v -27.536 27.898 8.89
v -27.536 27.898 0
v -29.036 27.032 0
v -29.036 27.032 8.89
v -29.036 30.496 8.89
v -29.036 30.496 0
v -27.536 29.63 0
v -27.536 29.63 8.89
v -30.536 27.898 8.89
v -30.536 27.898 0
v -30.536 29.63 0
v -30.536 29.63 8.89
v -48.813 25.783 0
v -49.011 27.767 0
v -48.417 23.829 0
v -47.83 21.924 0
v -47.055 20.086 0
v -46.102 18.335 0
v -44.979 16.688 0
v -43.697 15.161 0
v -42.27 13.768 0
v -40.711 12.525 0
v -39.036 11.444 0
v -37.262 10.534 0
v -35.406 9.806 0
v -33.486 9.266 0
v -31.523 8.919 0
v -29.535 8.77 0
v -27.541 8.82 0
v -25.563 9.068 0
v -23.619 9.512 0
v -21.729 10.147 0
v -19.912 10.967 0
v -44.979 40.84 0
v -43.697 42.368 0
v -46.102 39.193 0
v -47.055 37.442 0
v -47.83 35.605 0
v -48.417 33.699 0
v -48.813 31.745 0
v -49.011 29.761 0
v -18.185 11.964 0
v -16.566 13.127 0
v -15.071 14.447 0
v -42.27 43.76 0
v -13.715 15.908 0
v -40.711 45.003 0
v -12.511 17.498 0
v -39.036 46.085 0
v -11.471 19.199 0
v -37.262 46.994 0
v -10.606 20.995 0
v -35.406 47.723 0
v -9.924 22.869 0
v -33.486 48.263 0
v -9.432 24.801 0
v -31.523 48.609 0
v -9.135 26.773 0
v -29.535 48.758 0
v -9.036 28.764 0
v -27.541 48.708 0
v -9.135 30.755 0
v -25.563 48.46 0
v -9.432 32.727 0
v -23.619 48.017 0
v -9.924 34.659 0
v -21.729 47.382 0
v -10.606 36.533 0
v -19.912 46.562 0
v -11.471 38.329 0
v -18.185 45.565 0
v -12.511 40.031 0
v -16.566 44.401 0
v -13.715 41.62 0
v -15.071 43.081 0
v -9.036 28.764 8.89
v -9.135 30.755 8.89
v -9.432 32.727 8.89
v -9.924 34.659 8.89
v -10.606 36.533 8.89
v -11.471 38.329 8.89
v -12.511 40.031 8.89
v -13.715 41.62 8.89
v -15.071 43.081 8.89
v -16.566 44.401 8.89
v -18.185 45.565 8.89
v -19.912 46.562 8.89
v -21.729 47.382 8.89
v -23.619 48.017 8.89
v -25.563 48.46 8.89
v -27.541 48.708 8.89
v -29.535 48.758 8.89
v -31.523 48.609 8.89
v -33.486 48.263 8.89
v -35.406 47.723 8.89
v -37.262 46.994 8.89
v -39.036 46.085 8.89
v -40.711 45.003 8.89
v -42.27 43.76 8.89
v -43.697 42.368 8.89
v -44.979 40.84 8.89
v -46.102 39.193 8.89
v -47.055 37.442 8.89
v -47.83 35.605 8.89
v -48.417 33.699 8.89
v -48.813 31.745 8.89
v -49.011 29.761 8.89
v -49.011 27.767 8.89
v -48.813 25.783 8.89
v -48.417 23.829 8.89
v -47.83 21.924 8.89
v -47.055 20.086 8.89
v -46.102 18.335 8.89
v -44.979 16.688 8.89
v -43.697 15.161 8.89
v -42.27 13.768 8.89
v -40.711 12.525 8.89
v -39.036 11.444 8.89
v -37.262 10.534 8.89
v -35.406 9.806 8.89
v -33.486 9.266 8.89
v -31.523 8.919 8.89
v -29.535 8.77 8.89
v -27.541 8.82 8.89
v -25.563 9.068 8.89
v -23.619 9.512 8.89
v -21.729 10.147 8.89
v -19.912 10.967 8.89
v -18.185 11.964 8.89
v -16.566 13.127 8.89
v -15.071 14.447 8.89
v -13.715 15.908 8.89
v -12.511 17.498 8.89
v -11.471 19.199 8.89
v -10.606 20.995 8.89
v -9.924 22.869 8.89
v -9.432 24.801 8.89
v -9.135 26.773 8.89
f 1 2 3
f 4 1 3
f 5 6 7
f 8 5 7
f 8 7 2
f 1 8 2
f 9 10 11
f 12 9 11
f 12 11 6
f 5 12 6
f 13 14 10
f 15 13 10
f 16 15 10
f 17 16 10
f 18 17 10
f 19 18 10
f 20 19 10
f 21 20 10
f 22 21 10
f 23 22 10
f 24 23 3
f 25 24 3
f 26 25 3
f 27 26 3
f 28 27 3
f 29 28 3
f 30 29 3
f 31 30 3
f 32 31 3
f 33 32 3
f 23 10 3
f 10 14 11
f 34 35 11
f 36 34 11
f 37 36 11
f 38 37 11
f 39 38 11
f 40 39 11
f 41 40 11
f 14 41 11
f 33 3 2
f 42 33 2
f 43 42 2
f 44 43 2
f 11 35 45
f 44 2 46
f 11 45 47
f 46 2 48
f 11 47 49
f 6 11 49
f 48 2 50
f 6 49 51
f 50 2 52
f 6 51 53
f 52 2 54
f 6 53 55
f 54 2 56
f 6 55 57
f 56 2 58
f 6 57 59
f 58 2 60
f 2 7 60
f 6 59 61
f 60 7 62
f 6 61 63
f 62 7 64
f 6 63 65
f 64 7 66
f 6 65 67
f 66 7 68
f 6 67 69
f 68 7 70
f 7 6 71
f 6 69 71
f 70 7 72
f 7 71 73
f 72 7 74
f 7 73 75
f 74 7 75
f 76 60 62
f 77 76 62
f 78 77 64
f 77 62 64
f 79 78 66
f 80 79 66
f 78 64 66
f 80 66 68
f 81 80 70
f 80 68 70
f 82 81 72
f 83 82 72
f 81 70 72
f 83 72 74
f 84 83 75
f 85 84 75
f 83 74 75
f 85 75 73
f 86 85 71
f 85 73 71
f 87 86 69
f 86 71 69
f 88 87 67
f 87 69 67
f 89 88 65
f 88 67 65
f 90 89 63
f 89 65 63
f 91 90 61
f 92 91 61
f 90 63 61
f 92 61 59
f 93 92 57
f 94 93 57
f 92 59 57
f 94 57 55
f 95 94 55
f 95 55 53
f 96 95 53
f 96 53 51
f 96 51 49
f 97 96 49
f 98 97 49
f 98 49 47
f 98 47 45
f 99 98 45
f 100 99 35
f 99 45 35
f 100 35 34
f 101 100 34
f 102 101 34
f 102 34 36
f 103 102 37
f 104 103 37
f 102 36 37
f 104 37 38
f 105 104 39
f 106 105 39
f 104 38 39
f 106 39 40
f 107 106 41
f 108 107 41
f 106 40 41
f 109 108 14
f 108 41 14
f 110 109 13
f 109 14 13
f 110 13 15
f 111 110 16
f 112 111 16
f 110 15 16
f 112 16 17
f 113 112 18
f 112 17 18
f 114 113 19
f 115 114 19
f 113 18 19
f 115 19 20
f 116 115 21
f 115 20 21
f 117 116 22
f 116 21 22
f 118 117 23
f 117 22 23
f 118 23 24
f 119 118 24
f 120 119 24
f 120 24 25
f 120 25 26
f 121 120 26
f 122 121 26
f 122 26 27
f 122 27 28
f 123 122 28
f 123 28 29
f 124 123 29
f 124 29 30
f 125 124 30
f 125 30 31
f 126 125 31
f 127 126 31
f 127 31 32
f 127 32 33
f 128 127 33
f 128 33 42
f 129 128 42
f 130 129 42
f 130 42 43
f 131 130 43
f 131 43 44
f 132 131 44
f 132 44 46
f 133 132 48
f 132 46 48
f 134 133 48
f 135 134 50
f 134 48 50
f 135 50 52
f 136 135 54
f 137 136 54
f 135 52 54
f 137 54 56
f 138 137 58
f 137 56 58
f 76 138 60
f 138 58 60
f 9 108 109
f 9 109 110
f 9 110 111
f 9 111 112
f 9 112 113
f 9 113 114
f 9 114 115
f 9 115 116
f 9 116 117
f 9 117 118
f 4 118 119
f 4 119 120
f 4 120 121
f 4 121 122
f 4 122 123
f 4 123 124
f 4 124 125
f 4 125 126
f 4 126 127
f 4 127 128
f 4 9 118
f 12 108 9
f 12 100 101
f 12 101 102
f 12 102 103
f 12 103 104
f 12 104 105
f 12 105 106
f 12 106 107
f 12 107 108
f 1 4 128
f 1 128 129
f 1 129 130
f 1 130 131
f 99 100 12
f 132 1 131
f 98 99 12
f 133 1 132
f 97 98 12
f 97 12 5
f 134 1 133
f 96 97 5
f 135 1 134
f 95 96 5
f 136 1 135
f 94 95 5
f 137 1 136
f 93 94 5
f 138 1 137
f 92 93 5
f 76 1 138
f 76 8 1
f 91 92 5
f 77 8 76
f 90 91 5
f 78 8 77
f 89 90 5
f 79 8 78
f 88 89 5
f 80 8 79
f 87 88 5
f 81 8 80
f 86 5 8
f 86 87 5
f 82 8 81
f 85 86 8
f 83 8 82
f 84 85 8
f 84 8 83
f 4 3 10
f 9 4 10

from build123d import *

# Parameters (mm, degrees)
F0_R     = 20
F1_DEPTH = 8.89
F2_DEPTH = 8.89


with BuildPart() as f1:
    # F0 (on Top) → F1 (new body)
    with BuildSketch(Plane.XY):
        with Locations((-29.035902, 28.764101)):
            Circle(F0_R)
        Polygon((-29.035902, 30.496152), (-27.535902, 29.630126), (-27.535902, 27.898075), (-29.035902, 27.03205), (-30.535902, 27.898075), (-30.535902, 29.630126), align=None, mode=Mode.SUBTRACT)
    extrude(amount=F1_DEPTH)

    # F0 (on Top) → F2 (cut)
    with BuildSketch(Plane.XY):
        Polygon((-27.535902, 27.898075), (-27.535902, 29.630126), (-29.035902, 30.496152), (-30.535902, 29.630126), (-30.535902, 27.898075), (-29.035902, 27.03205), align=None)
    extrude(amount=F2_DEPTH, mode=Mode.SUBTRACT)


solid = f1.part
